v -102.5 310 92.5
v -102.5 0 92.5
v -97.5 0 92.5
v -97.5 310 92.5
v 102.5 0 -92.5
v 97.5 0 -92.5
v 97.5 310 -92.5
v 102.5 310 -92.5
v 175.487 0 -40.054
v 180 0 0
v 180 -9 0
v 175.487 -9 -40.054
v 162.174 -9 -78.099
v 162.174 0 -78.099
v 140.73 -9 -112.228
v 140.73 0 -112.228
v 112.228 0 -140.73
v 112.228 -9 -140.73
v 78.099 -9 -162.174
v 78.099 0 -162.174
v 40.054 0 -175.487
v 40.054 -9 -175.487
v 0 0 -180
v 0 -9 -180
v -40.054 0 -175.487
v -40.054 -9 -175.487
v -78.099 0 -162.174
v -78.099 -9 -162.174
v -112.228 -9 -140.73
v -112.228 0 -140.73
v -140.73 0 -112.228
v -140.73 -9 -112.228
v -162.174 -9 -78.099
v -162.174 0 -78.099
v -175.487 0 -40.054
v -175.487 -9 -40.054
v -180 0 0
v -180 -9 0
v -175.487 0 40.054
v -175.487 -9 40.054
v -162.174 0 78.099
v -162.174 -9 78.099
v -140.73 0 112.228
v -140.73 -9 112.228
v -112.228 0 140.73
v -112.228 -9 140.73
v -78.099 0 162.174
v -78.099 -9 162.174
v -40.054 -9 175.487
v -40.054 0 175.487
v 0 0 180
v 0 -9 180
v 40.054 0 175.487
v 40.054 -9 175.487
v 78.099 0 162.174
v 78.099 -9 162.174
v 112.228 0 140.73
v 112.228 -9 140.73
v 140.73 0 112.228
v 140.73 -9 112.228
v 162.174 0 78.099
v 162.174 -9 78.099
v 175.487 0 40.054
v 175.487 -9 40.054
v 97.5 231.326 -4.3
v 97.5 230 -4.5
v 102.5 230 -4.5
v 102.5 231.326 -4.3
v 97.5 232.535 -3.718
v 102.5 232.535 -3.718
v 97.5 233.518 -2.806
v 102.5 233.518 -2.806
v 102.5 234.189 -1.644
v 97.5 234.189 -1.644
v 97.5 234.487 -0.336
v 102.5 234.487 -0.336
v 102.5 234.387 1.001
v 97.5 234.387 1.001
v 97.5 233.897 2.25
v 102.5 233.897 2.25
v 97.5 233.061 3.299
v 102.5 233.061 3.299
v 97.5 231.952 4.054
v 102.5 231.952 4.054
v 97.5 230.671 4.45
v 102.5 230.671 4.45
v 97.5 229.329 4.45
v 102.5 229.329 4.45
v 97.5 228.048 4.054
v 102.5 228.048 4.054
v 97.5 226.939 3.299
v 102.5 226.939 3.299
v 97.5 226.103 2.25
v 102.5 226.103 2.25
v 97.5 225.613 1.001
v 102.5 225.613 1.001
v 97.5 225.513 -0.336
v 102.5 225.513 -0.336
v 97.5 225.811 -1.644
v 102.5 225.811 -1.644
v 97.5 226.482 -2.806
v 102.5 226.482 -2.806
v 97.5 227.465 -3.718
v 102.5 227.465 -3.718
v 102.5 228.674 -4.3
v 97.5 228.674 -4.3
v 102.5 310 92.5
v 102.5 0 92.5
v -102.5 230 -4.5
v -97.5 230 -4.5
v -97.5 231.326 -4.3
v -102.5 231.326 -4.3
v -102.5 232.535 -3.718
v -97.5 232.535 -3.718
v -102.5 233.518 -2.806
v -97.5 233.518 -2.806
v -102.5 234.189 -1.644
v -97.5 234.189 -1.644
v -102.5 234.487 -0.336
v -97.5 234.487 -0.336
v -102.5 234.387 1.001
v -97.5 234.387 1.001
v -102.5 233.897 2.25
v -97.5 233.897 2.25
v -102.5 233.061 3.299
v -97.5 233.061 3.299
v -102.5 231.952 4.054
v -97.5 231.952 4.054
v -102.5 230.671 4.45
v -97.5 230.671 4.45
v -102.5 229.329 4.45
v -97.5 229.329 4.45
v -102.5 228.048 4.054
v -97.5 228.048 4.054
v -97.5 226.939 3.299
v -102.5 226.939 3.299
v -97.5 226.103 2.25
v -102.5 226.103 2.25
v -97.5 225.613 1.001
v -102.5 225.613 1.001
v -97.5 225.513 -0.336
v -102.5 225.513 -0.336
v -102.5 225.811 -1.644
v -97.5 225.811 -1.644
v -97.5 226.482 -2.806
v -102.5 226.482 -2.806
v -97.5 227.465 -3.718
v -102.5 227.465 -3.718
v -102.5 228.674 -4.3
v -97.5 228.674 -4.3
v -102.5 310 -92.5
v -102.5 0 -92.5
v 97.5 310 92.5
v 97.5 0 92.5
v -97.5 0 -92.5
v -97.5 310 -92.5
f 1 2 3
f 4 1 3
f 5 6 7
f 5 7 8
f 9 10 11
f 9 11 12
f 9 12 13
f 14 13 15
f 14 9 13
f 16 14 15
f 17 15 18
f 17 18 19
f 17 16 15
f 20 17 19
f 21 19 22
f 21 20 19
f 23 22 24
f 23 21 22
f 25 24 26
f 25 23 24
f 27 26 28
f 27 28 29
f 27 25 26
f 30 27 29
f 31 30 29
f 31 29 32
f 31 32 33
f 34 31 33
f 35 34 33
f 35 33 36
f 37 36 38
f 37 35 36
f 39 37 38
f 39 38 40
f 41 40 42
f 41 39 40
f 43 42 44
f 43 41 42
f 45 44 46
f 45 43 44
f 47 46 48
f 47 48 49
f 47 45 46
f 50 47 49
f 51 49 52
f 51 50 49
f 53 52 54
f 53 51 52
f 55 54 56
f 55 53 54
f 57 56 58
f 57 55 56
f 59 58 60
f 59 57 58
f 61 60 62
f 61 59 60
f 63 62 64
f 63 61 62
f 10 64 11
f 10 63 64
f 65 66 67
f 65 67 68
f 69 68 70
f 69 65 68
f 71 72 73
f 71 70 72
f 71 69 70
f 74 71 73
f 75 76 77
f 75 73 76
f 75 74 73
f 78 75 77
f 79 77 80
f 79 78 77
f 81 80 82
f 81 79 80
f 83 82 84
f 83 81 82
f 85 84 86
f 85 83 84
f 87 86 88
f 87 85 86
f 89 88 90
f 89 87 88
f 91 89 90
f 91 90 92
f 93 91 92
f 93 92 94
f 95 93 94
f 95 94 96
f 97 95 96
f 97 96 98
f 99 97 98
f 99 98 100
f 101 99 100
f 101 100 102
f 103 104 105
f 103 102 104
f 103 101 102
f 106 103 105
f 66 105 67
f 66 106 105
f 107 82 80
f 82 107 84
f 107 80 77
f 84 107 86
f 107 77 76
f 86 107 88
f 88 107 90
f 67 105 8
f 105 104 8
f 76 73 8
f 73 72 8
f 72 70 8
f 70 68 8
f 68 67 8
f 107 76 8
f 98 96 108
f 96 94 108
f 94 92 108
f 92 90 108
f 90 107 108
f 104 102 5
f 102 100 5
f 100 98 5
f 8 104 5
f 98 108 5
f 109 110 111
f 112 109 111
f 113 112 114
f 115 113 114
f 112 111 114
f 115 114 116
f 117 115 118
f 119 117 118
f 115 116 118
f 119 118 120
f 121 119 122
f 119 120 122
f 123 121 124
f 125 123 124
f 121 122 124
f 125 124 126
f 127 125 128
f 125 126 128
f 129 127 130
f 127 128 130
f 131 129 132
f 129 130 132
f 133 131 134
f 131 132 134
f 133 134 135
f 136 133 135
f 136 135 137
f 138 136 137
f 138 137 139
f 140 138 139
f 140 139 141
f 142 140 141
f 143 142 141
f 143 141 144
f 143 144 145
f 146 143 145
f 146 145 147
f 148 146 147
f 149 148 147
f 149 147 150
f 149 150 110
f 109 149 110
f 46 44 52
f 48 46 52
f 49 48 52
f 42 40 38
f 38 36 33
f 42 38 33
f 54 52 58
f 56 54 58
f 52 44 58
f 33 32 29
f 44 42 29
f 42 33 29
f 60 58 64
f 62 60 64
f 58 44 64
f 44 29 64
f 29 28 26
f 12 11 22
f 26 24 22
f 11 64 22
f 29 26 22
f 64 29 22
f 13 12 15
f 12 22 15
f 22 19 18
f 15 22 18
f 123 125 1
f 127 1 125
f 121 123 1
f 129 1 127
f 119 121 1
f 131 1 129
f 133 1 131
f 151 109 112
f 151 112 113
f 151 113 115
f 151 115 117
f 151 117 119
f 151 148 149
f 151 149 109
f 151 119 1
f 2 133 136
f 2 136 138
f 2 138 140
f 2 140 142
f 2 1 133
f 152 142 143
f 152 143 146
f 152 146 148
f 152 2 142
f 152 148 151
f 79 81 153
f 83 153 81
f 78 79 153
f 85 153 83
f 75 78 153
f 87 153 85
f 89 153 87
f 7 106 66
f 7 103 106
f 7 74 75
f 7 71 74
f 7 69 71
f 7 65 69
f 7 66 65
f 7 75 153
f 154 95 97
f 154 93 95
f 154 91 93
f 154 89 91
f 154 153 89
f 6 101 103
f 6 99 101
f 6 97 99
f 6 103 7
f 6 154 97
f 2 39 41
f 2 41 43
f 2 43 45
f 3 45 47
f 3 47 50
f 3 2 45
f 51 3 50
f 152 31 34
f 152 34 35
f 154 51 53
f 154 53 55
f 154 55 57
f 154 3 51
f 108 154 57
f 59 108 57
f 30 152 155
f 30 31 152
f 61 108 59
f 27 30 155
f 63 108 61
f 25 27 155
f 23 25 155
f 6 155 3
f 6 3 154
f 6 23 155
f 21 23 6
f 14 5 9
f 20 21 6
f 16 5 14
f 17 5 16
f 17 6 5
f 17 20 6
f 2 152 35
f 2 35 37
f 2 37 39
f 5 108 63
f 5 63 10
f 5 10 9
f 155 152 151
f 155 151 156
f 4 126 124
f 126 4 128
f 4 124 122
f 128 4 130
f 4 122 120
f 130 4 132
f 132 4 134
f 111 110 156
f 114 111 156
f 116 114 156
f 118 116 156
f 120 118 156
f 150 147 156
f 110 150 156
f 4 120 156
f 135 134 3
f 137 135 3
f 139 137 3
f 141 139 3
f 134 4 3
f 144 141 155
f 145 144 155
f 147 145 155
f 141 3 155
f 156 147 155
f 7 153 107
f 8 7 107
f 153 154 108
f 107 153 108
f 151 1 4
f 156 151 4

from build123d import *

# Parameters (mm, degrees)
SKETCH2_R               = 180
BOSS_EXTRUDE1_DEPTH     = 9
SKETCH3_W               = 5
SKETCH3_H               = 185
BOSS_EXTRUDE2_DEPTH     = 310
SKETCH7_R               = 4.5
CUT_EXTRUDE2_DEPTH      = 181
CUT_EXTRUDE2_DEPTH_BACK = 181


with BuildPart() as part:
    # Sketch2 → Boss-Extrude1 (new body)
    with BuildSketch(Plane(origin=(0, 0, 0), x_dir=(1, 0, 0), z_dir=(0, 1, 0))):
        Circle(SKETCH2_R)
    extrude(amount=-BOSS_EXTRUDE1_DEPTH)

    # Sketch3 → Boss-Extrude2 (add)
    with BuildSketch(Plane(origin=(0, 0, 0), x_dir=(1, 0, 0), z_dir=(0, 1, 0))):
        with Locations((-100, 0)):
            Rectangle(SKETCH3_W, SKETCH3_H)
        with Locations((100, 0)):
            Rectangle(SKETCH3_W, SKETCH3_H)
    extrude(amount=BOSS_EXTRUDE2_DEPTH)

    # Sketch7 → Cut-Extrude2 (cut, two sides)
    with BuildSketch(Plane(origin=(0, 0, 0), x_dir=(0, 0, -1), z_dir=(1, 0, 0))) as cut_extrude2_sk:
        with Locations((0, 230)):
            Circle(SKETCH7_R)
    extrude(amount=CUT_EXTRUDE2_DEPTH, mode=Mode.SUBTRACT)
    extrude(cut_extrude2_sk.sketch, amount=-CUT_EXTRUDE2_DEPTH_BACK, mode=Mode.SUBTRACT)


solid = part.part
